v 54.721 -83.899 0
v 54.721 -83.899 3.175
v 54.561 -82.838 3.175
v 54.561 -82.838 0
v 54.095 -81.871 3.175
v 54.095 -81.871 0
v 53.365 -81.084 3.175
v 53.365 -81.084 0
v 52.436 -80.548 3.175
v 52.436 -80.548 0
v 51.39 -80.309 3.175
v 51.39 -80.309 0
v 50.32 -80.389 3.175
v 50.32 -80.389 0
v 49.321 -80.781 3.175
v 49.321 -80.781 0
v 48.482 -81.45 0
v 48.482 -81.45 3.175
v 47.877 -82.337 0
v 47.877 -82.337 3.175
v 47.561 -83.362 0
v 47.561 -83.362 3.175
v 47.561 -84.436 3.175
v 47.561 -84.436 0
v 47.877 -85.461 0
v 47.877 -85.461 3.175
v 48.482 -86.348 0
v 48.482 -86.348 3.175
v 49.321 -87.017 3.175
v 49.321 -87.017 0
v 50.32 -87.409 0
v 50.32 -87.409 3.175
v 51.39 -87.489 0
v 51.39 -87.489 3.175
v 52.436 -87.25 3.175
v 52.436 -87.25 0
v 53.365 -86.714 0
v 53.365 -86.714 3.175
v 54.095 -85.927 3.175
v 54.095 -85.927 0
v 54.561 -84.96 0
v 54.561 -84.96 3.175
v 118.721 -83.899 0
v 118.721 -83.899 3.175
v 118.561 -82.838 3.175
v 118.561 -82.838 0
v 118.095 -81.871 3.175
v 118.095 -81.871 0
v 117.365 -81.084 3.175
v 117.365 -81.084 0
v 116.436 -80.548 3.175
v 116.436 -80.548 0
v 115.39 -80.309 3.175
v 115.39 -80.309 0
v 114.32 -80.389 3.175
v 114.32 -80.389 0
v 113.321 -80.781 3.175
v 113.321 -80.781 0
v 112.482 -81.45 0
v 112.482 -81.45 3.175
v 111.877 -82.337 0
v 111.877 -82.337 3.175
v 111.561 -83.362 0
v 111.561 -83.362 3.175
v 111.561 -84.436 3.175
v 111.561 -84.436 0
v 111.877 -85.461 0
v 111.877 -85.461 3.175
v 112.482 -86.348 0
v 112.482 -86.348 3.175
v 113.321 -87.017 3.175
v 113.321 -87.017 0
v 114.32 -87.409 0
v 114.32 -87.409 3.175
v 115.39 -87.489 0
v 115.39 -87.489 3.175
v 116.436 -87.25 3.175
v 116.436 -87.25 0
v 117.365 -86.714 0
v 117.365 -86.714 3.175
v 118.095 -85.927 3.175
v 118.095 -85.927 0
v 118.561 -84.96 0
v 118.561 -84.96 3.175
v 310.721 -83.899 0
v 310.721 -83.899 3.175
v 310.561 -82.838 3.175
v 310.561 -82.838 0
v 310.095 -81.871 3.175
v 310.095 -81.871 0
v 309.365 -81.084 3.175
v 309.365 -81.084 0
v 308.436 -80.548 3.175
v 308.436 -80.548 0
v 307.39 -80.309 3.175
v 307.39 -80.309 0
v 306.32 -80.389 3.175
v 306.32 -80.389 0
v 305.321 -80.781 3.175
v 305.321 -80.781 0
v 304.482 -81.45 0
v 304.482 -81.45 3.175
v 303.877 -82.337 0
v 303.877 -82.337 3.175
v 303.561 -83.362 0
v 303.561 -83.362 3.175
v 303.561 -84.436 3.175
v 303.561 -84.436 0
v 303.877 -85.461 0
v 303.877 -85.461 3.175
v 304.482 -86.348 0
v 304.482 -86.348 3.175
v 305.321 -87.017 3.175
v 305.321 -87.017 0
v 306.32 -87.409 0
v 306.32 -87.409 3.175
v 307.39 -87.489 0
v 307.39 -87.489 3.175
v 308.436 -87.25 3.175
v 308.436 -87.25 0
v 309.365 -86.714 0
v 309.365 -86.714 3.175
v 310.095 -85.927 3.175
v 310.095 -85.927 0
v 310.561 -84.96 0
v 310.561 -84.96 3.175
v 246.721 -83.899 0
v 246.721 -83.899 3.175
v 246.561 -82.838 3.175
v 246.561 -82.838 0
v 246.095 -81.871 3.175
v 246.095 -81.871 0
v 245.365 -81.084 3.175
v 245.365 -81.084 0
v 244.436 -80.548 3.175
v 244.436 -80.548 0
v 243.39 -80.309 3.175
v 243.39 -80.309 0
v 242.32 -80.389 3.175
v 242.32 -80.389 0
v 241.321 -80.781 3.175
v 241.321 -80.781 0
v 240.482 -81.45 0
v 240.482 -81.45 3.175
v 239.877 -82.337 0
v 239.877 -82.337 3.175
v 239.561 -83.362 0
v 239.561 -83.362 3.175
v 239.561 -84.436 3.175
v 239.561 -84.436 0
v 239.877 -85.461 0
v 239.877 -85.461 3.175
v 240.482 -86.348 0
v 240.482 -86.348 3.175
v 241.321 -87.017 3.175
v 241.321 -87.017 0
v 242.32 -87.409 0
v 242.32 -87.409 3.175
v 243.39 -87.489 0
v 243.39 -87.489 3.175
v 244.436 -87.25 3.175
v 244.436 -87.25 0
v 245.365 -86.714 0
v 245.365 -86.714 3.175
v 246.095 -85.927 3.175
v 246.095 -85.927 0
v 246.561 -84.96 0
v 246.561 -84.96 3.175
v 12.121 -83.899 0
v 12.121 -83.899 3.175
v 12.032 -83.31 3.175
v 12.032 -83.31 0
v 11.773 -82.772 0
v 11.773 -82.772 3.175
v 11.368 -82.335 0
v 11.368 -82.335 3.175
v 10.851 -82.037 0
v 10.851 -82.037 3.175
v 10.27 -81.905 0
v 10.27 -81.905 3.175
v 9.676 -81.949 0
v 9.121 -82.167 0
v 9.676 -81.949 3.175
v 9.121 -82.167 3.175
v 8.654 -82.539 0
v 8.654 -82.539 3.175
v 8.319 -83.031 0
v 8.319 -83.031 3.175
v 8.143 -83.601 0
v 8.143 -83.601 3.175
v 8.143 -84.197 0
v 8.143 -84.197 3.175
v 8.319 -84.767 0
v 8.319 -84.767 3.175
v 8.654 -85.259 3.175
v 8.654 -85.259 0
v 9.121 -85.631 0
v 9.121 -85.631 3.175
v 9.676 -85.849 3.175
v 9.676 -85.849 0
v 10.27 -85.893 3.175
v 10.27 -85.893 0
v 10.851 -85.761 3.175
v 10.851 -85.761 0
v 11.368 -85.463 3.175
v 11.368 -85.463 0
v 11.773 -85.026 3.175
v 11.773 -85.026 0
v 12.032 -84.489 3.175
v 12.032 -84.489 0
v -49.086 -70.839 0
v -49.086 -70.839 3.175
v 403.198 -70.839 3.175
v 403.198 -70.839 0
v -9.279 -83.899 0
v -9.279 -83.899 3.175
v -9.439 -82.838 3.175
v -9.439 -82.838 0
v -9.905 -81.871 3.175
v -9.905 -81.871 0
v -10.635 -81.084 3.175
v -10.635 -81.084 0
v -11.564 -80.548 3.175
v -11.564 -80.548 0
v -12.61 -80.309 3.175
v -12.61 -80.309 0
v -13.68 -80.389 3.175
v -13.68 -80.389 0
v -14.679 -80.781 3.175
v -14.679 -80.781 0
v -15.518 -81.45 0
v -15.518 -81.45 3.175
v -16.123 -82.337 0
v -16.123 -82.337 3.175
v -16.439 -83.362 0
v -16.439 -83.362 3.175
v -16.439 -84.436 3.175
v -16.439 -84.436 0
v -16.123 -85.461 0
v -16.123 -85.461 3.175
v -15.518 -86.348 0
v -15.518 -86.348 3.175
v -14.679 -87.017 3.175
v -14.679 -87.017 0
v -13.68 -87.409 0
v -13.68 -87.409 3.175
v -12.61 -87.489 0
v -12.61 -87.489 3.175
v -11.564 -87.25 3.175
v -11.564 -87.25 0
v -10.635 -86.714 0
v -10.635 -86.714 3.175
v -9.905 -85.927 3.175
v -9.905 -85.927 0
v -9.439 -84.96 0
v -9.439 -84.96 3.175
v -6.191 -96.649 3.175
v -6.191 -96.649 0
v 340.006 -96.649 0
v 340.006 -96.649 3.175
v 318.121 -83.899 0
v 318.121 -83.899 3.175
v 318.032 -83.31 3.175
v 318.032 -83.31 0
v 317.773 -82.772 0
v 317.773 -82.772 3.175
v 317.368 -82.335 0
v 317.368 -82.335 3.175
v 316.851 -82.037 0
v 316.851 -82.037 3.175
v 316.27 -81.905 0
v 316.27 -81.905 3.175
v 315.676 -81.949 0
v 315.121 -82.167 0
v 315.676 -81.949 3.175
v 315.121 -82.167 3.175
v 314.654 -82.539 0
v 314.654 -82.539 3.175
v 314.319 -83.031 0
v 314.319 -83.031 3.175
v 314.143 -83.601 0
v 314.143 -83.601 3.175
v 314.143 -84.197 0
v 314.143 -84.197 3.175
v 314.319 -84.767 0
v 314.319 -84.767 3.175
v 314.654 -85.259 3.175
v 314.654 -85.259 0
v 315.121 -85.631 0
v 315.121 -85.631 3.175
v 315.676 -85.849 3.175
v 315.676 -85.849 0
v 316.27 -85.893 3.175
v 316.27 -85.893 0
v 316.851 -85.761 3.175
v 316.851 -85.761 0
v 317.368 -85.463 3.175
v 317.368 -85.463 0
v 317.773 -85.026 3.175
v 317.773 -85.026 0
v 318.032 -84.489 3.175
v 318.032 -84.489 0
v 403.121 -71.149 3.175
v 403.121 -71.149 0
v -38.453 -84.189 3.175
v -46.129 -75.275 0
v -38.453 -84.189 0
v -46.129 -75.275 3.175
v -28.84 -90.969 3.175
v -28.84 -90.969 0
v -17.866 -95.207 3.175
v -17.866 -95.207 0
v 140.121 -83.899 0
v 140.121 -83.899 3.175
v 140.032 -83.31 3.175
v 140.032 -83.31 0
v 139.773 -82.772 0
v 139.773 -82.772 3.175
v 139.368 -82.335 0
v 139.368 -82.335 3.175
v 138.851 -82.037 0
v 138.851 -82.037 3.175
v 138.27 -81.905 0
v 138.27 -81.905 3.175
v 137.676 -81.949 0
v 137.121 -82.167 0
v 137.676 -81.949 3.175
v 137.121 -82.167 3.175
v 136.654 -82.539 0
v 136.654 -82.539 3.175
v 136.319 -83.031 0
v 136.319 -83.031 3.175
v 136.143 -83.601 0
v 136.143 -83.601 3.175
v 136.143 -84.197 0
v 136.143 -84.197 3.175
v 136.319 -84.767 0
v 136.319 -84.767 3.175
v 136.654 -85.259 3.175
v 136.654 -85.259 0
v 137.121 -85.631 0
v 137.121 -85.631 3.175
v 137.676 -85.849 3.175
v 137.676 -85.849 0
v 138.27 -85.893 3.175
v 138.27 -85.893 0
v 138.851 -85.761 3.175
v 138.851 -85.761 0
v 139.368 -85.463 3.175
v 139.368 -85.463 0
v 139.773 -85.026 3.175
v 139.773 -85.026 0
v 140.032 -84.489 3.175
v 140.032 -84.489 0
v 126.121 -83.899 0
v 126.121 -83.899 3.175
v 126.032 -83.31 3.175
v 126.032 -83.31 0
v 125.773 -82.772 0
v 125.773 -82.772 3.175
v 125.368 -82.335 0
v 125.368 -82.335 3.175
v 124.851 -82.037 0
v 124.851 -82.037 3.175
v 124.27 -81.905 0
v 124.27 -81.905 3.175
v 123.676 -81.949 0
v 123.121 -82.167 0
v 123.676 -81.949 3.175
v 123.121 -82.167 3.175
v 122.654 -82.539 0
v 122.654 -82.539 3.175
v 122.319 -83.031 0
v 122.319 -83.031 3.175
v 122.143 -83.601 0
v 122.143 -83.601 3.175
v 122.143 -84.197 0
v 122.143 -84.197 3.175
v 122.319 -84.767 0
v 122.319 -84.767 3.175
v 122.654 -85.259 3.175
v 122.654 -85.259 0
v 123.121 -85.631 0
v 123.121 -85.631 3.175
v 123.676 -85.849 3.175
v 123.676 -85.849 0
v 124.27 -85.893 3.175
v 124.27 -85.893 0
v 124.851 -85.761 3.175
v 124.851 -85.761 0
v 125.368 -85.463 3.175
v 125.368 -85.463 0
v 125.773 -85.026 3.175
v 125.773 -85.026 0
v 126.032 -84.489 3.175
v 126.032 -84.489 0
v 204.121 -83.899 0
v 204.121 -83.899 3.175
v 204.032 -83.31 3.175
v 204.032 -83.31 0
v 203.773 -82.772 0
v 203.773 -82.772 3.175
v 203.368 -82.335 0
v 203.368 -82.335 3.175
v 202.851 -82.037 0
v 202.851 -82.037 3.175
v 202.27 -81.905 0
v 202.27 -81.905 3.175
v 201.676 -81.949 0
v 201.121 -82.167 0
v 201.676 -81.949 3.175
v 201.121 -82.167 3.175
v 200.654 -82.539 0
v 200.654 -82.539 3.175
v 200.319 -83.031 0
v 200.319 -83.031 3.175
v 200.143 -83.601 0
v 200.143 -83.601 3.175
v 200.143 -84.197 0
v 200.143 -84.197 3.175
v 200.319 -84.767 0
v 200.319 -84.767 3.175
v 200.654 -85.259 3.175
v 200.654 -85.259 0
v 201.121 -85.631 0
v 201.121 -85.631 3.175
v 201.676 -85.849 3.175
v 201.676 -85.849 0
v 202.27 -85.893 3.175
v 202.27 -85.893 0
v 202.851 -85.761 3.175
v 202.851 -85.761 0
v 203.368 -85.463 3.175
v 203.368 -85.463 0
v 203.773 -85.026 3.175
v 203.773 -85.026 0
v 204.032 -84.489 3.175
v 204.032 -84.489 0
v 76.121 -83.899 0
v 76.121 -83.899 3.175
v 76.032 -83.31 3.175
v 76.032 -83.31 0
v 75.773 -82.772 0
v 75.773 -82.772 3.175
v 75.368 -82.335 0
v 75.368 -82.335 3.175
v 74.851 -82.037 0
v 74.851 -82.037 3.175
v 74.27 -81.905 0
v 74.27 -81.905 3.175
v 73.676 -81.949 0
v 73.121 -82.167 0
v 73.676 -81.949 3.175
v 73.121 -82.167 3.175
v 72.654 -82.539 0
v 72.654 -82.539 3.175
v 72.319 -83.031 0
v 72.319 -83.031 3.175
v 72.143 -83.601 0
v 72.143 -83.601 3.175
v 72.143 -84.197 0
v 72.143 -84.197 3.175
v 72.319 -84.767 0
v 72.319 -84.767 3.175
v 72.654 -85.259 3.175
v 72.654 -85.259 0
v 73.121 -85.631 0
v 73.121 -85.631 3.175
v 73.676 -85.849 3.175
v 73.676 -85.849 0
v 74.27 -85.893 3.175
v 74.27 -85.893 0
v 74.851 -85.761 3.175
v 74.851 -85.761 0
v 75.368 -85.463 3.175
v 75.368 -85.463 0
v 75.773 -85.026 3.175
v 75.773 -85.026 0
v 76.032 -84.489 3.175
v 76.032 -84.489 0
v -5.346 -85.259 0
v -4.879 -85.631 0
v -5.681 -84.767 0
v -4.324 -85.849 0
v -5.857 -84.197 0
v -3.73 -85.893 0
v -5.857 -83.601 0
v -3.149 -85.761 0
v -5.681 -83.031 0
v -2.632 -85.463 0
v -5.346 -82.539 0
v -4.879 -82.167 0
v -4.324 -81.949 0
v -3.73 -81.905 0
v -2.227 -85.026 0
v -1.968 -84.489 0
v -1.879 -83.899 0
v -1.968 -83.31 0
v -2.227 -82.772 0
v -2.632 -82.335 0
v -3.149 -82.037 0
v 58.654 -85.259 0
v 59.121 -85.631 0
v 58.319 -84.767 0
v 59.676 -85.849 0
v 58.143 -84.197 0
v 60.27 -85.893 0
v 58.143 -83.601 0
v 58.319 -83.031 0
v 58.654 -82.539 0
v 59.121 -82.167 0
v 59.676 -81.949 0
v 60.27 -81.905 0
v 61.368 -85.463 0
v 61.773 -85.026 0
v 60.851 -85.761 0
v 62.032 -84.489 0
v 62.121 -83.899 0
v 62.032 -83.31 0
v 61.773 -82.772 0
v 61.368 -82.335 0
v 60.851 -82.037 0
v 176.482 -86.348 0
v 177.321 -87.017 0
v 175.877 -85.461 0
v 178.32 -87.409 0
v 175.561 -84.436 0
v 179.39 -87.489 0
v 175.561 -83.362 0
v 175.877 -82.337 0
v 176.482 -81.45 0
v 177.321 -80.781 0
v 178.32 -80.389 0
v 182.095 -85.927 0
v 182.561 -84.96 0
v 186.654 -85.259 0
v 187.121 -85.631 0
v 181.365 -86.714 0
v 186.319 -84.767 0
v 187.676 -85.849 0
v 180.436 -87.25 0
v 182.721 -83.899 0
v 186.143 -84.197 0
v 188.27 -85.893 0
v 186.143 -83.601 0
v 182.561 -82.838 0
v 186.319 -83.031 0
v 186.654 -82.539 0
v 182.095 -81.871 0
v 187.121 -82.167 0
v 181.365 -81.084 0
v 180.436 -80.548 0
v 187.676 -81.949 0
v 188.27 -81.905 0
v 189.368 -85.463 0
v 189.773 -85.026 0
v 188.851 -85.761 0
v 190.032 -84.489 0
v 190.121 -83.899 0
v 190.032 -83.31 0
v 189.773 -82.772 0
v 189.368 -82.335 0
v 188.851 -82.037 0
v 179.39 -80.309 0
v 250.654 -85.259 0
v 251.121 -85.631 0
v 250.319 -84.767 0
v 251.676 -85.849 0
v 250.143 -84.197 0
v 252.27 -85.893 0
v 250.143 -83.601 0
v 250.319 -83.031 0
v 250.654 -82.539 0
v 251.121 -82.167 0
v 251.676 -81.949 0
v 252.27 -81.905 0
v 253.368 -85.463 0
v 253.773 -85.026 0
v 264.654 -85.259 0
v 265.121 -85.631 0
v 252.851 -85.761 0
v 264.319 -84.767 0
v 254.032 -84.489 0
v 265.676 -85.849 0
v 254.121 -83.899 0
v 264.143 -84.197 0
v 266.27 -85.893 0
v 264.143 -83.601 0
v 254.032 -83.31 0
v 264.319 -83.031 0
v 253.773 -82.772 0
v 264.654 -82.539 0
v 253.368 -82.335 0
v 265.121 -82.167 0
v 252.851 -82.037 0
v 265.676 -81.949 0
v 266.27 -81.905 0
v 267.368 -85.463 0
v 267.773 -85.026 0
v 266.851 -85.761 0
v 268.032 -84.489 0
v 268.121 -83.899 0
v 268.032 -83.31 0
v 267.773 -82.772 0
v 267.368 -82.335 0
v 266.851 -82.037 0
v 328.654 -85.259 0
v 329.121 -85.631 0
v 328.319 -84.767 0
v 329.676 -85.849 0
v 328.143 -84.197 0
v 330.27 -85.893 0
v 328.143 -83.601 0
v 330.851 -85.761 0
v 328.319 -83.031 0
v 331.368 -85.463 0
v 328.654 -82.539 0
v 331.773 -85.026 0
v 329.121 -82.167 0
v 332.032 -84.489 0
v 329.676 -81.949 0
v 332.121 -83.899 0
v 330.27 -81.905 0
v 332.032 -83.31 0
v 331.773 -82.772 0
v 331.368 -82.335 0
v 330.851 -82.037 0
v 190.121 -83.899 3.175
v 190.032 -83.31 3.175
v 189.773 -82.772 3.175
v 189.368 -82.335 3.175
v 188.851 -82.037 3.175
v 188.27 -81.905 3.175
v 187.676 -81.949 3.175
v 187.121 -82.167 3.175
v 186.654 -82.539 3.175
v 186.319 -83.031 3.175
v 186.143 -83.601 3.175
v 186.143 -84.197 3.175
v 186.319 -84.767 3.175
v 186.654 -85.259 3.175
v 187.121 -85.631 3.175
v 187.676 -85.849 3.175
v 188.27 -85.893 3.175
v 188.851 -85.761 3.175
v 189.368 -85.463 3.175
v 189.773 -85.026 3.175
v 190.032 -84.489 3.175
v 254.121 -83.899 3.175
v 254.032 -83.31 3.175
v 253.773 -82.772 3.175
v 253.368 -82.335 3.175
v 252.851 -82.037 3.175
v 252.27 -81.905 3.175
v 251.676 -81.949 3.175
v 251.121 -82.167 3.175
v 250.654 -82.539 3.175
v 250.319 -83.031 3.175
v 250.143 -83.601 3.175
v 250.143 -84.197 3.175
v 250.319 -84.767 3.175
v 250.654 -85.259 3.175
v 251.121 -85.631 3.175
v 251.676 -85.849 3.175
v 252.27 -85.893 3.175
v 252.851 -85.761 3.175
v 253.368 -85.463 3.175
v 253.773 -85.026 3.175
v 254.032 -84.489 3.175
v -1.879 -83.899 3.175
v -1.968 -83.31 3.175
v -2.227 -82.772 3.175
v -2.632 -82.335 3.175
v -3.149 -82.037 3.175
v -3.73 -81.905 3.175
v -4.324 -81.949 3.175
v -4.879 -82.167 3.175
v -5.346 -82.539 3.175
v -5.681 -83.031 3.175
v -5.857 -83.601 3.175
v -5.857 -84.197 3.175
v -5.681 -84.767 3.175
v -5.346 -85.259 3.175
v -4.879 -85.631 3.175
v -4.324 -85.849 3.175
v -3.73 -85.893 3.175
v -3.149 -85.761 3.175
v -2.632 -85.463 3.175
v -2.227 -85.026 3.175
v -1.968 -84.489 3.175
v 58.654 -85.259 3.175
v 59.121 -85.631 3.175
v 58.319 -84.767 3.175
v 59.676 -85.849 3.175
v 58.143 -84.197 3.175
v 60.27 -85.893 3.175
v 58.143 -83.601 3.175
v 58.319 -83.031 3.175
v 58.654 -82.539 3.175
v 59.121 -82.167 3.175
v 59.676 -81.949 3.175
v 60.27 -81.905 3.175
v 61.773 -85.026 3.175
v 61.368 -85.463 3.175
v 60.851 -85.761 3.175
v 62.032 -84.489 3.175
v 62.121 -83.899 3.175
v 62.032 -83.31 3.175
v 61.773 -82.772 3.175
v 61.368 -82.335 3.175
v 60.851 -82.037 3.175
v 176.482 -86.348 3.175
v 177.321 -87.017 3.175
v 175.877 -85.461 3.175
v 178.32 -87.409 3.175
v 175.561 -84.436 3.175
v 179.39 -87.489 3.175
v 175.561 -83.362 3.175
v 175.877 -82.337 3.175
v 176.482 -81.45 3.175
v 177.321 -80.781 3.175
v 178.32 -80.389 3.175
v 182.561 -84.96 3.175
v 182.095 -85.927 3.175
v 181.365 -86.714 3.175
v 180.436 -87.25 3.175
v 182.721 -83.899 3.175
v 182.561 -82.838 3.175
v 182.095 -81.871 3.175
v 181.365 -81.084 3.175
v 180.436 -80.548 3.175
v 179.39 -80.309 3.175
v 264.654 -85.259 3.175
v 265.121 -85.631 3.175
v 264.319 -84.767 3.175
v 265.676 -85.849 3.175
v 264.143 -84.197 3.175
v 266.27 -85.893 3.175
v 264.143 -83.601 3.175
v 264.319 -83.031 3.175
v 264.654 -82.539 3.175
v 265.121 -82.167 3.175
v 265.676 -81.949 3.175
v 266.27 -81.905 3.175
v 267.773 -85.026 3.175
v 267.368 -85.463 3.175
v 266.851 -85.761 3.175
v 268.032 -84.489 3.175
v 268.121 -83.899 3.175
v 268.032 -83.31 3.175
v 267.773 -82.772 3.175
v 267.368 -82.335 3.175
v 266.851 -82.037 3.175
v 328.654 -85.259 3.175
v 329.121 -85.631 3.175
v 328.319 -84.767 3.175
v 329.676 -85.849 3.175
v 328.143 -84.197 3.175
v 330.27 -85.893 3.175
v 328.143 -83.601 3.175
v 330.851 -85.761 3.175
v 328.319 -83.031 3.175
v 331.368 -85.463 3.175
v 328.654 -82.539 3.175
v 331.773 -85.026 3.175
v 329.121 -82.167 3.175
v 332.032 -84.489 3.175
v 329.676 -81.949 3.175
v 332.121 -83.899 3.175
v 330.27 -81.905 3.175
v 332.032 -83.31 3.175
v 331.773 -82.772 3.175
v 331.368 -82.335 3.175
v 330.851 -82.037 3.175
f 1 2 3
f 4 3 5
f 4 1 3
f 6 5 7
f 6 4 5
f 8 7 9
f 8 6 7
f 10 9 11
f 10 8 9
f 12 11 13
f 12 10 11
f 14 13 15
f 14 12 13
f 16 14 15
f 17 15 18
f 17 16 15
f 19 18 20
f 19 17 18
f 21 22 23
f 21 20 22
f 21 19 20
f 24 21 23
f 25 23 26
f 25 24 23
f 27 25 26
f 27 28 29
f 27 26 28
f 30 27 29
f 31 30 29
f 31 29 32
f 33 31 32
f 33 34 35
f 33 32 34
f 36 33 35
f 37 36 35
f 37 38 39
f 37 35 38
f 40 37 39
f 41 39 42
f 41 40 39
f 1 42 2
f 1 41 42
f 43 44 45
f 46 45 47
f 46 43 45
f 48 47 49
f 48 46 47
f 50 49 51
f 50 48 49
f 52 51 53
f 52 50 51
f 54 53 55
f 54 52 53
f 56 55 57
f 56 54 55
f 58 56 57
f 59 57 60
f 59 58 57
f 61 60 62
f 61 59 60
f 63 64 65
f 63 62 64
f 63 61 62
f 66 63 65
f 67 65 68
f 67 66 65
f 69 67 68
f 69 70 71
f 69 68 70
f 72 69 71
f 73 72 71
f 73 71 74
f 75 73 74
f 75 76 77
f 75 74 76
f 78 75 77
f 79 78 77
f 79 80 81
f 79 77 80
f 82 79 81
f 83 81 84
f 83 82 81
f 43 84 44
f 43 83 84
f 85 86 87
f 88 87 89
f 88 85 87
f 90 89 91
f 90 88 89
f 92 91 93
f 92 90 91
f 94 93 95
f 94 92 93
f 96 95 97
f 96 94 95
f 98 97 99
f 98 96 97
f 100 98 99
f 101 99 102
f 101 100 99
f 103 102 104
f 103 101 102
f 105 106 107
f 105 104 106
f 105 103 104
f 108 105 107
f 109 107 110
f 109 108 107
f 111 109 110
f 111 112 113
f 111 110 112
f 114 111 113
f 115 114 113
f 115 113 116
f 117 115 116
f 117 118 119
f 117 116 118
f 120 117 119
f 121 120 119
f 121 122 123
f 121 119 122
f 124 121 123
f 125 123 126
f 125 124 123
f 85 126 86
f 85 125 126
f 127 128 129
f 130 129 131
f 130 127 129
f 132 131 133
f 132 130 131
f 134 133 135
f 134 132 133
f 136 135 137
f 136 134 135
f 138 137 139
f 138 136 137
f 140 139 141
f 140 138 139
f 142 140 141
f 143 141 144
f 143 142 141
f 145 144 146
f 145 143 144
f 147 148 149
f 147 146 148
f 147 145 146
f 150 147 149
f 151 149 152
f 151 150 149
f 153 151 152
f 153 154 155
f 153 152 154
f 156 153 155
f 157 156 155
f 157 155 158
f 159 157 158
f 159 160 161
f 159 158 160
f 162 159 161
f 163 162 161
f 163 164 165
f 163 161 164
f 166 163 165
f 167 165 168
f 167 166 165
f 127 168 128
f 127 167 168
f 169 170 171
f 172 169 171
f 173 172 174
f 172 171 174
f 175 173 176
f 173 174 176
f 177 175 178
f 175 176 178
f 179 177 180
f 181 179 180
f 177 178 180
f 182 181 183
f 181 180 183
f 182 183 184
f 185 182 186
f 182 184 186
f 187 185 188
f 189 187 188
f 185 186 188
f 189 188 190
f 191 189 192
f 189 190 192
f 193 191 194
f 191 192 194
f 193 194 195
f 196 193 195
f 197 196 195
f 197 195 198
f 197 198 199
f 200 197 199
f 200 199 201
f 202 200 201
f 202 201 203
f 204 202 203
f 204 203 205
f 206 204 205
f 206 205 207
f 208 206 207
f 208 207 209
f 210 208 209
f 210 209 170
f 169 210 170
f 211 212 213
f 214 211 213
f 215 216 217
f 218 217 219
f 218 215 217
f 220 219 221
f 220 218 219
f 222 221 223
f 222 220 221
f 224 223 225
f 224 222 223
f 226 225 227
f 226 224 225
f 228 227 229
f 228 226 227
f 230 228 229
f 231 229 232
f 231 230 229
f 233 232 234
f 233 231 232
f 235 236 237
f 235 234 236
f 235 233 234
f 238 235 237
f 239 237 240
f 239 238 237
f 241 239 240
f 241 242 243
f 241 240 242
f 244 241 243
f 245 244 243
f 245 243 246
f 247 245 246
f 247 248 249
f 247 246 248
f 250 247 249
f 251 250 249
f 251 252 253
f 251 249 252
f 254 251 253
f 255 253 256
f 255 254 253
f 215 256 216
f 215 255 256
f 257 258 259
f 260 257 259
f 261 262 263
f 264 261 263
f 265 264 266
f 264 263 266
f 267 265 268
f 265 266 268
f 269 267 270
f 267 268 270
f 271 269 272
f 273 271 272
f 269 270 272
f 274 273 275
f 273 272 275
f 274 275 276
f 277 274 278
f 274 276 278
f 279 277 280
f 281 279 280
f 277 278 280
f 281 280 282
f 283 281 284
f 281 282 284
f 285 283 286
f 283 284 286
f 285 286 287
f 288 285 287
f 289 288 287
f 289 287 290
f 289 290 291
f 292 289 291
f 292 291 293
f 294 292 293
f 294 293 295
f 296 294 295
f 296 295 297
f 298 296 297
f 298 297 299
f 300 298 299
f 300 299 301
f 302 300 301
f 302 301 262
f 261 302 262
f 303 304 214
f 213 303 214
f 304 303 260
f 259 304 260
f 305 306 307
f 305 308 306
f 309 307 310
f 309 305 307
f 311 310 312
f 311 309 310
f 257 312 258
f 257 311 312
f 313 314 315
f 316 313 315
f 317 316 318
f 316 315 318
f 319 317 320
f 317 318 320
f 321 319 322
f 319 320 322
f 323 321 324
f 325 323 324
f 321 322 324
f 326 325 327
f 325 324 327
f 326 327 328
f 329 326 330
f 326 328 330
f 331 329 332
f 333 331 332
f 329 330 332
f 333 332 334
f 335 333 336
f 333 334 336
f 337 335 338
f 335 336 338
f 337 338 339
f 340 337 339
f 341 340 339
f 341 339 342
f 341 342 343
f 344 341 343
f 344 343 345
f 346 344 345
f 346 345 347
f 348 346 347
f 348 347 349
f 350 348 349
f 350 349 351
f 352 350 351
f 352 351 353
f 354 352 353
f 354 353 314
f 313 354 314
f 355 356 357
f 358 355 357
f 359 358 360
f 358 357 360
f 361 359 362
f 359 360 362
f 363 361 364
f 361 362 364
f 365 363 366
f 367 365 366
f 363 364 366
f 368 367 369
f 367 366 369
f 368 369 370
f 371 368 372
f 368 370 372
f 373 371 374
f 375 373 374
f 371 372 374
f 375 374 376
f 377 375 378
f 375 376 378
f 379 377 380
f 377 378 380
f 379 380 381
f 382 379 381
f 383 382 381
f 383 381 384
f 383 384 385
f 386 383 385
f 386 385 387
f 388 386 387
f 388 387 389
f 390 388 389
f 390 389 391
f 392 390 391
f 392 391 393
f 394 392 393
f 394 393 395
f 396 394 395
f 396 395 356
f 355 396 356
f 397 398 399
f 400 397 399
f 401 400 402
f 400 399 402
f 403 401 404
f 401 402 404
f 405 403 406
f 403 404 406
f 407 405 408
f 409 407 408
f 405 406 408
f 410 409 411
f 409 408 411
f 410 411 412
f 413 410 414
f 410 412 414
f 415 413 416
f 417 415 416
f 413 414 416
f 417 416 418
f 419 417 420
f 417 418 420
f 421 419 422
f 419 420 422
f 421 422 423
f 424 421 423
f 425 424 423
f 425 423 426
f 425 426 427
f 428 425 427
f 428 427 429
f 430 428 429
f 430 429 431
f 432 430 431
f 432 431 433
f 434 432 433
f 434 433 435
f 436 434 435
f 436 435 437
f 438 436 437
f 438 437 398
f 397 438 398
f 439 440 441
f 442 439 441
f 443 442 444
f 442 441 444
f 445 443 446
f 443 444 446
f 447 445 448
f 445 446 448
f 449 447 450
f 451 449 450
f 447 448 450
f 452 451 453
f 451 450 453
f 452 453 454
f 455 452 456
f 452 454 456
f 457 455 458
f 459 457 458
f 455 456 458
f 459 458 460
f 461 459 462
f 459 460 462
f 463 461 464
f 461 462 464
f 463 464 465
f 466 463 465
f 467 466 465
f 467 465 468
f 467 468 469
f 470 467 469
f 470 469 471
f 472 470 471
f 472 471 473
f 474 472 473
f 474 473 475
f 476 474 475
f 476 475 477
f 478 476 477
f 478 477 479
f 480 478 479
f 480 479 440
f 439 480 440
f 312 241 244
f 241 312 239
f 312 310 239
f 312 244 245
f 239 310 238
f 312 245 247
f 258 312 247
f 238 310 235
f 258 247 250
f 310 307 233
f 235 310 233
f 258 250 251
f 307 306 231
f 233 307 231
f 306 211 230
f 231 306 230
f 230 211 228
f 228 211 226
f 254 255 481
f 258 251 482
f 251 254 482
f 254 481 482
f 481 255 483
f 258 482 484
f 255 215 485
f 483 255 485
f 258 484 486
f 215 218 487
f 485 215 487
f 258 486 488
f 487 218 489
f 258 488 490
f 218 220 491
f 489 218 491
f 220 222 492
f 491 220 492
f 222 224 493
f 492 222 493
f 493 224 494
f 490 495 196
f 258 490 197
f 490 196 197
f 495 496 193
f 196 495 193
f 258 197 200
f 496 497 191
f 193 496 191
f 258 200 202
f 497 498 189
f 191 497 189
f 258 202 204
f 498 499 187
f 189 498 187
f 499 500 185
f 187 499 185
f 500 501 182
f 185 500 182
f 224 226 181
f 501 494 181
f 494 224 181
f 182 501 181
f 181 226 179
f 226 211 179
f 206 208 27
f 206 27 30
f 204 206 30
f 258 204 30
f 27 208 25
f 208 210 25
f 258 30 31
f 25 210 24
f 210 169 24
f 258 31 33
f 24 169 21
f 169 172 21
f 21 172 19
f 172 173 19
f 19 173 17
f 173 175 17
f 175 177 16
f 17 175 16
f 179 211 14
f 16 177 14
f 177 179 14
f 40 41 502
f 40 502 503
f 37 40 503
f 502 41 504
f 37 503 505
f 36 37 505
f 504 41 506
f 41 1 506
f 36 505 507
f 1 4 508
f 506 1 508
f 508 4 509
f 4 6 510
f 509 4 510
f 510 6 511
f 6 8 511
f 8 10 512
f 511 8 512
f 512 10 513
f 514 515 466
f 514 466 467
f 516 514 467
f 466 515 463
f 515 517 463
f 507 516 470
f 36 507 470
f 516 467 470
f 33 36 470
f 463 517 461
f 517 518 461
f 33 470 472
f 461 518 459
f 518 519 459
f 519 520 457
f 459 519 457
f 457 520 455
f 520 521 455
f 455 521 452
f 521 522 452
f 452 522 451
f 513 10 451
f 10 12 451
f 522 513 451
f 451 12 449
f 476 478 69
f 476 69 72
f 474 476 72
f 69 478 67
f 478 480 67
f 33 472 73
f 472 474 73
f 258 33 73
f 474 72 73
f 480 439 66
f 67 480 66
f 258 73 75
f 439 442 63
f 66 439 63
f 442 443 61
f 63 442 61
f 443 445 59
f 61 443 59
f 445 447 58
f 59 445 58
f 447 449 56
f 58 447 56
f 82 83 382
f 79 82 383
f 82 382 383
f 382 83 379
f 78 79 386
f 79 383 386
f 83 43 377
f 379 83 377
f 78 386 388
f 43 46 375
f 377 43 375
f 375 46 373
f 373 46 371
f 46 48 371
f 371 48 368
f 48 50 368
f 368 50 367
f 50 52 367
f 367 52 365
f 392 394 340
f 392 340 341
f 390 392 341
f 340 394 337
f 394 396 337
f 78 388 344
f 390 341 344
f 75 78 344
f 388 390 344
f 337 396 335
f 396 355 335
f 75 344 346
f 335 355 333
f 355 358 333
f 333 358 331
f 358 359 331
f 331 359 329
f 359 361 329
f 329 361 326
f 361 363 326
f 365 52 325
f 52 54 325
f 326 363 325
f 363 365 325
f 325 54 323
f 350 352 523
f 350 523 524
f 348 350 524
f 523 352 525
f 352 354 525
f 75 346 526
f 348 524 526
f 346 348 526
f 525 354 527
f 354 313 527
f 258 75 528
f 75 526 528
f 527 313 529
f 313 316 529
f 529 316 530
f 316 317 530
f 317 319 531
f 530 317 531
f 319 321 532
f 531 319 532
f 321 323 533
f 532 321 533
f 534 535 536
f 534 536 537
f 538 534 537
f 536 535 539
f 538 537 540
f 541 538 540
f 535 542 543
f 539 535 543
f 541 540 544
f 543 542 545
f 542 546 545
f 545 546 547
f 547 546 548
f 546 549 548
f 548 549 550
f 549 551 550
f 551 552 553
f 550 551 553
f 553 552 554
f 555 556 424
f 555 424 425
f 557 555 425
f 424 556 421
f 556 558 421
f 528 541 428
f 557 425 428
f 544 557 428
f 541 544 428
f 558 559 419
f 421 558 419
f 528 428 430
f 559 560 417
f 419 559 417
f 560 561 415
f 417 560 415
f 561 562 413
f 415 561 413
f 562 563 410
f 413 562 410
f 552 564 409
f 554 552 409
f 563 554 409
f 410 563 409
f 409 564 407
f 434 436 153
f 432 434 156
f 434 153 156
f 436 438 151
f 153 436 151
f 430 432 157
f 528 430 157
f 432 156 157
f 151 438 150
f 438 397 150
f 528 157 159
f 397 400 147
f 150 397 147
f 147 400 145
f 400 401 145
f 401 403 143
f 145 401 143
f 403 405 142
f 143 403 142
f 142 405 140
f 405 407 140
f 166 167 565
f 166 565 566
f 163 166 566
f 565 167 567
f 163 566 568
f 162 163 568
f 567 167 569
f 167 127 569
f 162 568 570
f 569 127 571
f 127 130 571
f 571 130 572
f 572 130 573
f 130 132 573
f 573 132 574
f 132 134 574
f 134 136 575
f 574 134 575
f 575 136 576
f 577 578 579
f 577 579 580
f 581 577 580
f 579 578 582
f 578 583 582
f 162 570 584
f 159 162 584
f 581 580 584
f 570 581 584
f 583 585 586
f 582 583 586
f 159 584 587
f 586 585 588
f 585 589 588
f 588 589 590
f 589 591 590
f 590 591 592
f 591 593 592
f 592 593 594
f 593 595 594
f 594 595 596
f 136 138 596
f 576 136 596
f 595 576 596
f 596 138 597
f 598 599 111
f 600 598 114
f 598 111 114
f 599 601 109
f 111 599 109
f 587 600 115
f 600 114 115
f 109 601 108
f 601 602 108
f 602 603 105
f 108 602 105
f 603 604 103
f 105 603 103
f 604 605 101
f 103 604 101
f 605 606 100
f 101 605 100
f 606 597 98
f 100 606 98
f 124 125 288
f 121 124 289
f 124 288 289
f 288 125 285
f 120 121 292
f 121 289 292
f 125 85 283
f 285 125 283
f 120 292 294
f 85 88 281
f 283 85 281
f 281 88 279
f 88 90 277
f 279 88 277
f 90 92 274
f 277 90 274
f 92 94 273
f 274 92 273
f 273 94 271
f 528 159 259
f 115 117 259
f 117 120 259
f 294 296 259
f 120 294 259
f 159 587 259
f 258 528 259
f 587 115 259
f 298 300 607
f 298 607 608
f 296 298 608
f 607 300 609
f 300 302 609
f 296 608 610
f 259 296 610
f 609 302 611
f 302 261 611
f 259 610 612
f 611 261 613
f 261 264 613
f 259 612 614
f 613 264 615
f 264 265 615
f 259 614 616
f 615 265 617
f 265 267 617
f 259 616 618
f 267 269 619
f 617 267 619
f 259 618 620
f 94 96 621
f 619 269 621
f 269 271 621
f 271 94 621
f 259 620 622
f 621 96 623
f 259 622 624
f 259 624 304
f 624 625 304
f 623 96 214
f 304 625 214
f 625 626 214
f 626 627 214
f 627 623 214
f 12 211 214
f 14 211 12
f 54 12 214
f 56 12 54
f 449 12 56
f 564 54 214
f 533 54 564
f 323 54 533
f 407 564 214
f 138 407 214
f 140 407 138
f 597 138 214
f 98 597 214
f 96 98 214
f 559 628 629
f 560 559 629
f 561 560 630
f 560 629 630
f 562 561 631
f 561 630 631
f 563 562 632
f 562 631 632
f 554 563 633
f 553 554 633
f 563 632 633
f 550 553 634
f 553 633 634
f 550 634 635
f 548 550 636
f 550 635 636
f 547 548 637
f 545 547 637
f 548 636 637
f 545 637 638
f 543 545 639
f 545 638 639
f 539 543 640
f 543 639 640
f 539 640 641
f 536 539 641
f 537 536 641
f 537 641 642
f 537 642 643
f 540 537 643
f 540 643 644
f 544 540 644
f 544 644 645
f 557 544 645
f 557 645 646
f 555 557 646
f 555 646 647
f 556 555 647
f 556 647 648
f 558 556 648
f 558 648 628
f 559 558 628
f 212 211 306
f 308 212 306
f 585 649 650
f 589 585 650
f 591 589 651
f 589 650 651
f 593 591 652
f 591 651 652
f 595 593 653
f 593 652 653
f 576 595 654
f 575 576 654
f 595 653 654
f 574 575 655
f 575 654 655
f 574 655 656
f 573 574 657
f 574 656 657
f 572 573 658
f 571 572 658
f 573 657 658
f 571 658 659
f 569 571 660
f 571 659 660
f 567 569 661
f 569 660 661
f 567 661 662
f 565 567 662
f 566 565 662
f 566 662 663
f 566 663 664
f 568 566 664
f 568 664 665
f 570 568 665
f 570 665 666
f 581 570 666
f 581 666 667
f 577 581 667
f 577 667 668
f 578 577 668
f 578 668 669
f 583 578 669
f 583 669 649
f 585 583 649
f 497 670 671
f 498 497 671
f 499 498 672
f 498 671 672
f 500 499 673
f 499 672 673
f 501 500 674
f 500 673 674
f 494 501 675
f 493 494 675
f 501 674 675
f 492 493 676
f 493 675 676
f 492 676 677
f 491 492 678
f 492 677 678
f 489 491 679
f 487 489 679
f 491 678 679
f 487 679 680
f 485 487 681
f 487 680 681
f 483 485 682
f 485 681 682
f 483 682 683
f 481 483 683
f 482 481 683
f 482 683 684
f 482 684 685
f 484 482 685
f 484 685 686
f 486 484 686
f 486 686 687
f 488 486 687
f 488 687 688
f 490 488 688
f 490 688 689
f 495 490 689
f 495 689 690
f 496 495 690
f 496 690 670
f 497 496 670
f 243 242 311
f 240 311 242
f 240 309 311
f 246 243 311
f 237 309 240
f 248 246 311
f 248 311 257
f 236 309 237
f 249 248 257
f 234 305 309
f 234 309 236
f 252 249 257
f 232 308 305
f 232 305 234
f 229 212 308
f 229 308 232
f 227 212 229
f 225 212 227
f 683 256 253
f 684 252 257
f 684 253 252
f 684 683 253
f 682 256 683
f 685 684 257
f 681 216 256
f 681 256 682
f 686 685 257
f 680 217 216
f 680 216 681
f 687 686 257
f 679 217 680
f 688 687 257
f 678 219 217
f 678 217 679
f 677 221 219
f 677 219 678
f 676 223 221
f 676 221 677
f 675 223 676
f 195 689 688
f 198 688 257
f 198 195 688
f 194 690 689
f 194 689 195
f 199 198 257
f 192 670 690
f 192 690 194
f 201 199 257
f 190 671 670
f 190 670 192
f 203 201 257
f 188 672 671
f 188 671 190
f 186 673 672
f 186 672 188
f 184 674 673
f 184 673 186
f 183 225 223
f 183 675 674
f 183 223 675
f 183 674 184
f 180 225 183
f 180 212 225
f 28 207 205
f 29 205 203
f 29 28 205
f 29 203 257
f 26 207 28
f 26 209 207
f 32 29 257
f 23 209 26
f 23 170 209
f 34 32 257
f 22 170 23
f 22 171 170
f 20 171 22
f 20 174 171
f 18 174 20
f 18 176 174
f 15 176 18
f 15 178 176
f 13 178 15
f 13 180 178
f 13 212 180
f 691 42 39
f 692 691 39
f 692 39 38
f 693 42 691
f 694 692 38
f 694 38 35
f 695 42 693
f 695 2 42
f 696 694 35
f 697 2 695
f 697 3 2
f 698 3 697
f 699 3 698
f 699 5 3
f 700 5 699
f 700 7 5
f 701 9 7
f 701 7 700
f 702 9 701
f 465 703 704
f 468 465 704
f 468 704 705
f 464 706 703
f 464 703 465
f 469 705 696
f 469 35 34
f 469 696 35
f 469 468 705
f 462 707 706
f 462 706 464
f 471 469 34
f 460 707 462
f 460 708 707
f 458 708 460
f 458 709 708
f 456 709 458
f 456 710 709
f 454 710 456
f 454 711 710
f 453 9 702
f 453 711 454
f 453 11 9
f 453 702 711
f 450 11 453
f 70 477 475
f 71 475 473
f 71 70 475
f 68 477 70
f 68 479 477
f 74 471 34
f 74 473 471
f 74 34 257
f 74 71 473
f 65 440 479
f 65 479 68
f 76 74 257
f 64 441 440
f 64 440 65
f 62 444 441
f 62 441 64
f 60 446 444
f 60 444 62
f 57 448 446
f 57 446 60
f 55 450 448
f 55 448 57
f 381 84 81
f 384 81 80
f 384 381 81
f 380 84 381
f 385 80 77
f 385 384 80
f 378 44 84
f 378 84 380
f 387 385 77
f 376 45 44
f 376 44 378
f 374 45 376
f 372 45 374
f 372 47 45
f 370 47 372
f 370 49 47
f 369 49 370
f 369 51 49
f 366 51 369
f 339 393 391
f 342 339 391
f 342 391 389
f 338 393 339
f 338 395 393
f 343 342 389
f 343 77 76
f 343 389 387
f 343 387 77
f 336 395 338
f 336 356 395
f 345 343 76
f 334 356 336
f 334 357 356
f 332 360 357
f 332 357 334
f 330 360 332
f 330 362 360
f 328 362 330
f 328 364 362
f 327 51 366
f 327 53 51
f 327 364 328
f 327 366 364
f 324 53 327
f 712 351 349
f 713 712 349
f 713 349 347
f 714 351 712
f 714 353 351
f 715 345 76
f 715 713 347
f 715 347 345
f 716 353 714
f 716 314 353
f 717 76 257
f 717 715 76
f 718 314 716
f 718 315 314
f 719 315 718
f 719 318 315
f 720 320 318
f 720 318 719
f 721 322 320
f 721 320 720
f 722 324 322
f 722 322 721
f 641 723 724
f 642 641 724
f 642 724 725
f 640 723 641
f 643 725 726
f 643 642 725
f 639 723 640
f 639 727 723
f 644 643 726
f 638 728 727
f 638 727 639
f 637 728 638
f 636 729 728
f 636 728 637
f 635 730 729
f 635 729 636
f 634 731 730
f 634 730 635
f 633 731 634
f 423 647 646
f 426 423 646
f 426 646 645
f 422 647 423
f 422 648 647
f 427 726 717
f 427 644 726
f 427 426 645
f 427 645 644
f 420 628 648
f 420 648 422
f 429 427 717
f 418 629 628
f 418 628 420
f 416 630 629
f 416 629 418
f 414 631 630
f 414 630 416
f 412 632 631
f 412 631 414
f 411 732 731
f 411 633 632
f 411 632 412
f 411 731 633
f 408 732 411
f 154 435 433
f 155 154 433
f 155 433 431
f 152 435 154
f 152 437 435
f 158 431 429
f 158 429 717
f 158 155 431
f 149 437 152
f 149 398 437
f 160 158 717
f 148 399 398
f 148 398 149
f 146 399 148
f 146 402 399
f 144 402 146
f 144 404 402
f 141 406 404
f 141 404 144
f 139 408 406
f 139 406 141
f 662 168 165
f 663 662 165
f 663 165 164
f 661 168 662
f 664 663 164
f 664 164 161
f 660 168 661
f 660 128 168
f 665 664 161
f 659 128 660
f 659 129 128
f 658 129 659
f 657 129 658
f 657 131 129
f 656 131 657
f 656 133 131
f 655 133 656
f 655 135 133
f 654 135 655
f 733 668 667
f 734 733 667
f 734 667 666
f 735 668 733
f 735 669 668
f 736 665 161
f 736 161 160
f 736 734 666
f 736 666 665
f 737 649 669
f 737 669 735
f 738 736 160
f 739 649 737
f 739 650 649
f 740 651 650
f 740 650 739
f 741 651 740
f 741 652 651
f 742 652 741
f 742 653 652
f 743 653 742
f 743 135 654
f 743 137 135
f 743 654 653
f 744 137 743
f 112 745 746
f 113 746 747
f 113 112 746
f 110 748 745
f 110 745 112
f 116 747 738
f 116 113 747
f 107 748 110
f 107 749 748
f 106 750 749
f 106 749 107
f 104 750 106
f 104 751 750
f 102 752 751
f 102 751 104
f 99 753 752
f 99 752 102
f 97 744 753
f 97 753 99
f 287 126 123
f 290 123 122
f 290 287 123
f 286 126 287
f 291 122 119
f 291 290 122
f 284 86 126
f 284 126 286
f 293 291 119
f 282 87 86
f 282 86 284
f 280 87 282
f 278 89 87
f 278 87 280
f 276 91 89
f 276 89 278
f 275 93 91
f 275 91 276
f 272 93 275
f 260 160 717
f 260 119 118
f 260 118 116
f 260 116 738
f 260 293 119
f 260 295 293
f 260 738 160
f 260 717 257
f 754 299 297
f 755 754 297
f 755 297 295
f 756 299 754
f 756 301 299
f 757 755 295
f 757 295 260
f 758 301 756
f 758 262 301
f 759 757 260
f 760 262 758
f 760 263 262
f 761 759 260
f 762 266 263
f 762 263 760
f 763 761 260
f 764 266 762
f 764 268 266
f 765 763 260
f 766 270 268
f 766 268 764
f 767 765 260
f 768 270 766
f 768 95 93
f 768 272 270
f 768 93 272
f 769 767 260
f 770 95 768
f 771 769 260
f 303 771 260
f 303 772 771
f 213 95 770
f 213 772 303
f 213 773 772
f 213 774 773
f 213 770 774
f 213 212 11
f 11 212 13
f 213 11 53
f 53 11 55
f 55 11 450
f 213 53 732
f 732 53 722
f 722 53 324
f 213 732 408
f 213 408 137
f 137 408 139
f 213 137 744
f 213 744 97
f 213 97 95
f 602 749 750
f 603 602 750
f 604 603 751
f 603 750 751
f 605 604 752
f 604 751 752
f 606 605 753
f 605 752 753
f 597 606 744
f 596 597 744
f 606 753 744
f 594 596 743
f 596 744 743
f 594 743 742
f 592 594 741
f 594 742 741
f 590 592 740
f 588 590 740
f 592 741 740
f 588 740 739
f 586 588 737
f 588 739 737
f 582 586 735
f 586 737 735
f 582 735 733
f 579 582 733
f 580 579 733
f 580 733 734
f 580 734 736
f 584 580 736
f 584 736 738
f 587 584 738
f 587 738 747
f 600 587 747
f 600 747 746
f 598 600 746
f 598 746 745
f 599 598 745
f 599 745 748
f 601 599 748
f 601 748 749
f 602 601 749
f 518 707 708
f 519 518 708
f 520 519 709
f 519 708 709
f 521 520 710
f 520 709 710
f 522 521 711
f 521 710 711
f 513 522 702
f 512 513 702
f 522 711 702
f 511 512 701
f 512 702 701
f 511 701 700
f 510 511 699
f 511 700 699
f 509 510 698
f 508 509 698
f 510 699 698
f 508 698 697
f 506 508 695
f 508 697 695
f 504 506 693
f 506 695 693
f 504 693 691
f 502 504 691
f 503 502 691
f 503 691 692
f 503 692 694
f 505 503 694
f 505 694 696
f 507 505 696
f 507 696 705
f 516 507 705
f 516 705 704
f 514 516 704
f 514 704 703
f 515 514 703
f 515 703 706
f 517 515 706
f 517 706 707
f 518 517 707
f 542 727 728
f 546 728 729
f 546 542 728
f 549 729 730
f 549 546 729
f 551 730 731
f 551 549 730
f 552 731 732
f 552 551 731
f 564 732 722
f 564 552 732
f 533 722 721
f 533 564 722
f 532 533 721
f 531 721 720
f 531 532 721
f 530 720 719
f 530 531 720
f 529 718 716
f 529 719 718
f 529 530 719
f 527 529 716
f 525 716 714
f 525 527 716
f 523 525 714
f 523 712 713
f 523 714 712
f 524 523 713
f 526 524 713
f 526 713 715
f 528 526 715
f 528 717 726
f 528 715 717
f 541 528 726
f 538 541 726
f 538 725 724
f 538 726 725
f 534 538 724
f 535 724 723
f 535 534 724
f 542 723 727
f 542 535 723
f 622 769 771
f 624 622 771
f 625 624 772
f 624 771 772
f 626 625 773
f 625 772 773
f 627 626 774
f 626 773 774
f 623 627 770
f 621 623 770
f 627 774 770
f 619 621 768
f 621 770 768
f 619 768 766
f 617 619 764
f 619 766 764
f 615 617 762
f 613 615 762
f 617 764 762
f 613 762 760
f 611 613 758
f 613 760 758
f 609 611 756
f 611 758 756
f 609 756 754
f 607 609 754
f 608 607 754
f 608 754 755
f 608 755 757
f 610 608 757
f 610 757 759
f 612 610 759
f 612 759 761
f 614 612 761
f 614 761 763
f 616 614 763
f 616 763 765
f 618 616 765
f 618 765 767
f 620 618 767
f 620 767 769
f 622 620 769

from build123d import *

# Parameters (mm, degrees)
BOSS_EXTRUDE1_DEPTH = 3.175
SKETCH1_4_R         = 3.6
CUT_EXTRUDE1_DEPTH  = 439.905857431
FILLET1_R           = 48
CUT_EXTRUDE3_DEPTH  = 10
CUT_EXTRUDE5_DEPTH  = 10
SKETCH11_R          = 2
CUT_EXTRUDE6_DEPTH  = 10


with BuildPart() as part:
    # Sketch1 → Boss-Extrude1 (new body)
    with BuildSketch(Plane.XY):
        Polygon((428.120588235, 28.939617947), (0.540381846, 28.939617947), (-115.605170134, 28.939617947), (-98.879411765, 3.850980392), (-31.879411765, -96.649019608), (366, -96.649019608), (403.120588235, -71.149019608), align=None)
    extrude(amount=BOSS_EXTRUDE1_DEPTH)

    # Sketch1<4> → Cut-Extrude1 (cut, through all)
    with BuildSketch(Plane.XY):
        with Locations((-12.879411765, -83.899019608)):
            Circle(SKETCH1_4_R)
        with Locations((51.120588235, -83.899019608)):
            Circle(SKETCH1_4_R)
        with Locations((115.120588235, -83.899019608)):
            Circle(SKETCH1_4_R)
        with Locations((179.120588235, -83.899019608)):
            Circle(SKETCH1_4_R)
        with Locations((243.120588235, -83.899019608)):
            Circle(SKETCH1_4_R)
        with Locations((307.120588235, -83.899019608)):
            Circle(SKETCH1_4_R)
    extrude(amount=CUT_EXTRUDE1_DEPTH, mode=Mode.SUBTRACT)

    # Fillet1
    fillet1_edges = [part.edges().sort_by_distance(p)[0] for p in [
        (-31.879411765, -96.649019608, 1.5875),
    ]]
    fillet(fillet1_edges, radius=FILLET1_R)

    # Sketch7 → Cut-Extrude3 (cut)
    with BuildSketch(Plane.XY.offset(3.175)):
        Polygon((403.120588235, -71.149019608), (340.005873473, -96.649019608), (366, -96.649019608), align=None)
    extrude(amount=-CUT_EXTRUDE3_DEPTH, mode=Mode.SUBTRACT)

    # Sketch10 → Cut-Extrude5 (cut)
    with BuildSketch(Plane.XY.offset(3.175)):
        Polygon((-49.086078431, -70.839019608), (403.198019602, -70.839019608), (428.120588235, 28.939617947), (-115.605170134, 28.939617947), align=None)
    extrude(amount=-CUT_EXTRUDE5_DEPTH, mode=Mode.SUBTRACT)

    # Sketch11 → Cut-Extrude6 (cut)
    with BuildSketch(Plane.XY.offset(3.175)):
        with Locations((-3.879411765, -83.899019608)):
            Circle(SKETCH11_R)
        with Locations((10.120588235, -83.899019608)):
            Circle(SKETCH11_R)
        with Locations((60.120588235, -83.899019608)):
            Circle(SKETCH11_R)
        with Locations((74.120588235, -83.899019608)):
            Circle(SKETCH11_R)
        with Locations((124.120588235, -83.899019608)):
            Circle(SKETCH11_R)
        with Locations((138.120588235, -83.899019608)):
            Circle(SKETCH11_R)
        with Locations((188.120588235, -83.899019608)):
            Circle(SKETCH11_R)
        with Locations((202.120588235, -83.899019608)):
            Circle(SKETCH11_R)
        with Locations((252.120588235, -83.899019608)):
            Circle(SKETCH11_R)
        with Locations((266.120588235, -83.899019608)):
            Circle(SKETCH11_R)
        with Locations((316.120588235, -83.899019608)):
            Circle(SKETCH11_R)
        with Locations((330.120588235, -83.899019608)):
            Circle(SKETCH11_R)
    extrude(amount=-CUT_EXTRUDE6_DEPTH, mode=Mode.SUBTRACT)


solid = part.part
